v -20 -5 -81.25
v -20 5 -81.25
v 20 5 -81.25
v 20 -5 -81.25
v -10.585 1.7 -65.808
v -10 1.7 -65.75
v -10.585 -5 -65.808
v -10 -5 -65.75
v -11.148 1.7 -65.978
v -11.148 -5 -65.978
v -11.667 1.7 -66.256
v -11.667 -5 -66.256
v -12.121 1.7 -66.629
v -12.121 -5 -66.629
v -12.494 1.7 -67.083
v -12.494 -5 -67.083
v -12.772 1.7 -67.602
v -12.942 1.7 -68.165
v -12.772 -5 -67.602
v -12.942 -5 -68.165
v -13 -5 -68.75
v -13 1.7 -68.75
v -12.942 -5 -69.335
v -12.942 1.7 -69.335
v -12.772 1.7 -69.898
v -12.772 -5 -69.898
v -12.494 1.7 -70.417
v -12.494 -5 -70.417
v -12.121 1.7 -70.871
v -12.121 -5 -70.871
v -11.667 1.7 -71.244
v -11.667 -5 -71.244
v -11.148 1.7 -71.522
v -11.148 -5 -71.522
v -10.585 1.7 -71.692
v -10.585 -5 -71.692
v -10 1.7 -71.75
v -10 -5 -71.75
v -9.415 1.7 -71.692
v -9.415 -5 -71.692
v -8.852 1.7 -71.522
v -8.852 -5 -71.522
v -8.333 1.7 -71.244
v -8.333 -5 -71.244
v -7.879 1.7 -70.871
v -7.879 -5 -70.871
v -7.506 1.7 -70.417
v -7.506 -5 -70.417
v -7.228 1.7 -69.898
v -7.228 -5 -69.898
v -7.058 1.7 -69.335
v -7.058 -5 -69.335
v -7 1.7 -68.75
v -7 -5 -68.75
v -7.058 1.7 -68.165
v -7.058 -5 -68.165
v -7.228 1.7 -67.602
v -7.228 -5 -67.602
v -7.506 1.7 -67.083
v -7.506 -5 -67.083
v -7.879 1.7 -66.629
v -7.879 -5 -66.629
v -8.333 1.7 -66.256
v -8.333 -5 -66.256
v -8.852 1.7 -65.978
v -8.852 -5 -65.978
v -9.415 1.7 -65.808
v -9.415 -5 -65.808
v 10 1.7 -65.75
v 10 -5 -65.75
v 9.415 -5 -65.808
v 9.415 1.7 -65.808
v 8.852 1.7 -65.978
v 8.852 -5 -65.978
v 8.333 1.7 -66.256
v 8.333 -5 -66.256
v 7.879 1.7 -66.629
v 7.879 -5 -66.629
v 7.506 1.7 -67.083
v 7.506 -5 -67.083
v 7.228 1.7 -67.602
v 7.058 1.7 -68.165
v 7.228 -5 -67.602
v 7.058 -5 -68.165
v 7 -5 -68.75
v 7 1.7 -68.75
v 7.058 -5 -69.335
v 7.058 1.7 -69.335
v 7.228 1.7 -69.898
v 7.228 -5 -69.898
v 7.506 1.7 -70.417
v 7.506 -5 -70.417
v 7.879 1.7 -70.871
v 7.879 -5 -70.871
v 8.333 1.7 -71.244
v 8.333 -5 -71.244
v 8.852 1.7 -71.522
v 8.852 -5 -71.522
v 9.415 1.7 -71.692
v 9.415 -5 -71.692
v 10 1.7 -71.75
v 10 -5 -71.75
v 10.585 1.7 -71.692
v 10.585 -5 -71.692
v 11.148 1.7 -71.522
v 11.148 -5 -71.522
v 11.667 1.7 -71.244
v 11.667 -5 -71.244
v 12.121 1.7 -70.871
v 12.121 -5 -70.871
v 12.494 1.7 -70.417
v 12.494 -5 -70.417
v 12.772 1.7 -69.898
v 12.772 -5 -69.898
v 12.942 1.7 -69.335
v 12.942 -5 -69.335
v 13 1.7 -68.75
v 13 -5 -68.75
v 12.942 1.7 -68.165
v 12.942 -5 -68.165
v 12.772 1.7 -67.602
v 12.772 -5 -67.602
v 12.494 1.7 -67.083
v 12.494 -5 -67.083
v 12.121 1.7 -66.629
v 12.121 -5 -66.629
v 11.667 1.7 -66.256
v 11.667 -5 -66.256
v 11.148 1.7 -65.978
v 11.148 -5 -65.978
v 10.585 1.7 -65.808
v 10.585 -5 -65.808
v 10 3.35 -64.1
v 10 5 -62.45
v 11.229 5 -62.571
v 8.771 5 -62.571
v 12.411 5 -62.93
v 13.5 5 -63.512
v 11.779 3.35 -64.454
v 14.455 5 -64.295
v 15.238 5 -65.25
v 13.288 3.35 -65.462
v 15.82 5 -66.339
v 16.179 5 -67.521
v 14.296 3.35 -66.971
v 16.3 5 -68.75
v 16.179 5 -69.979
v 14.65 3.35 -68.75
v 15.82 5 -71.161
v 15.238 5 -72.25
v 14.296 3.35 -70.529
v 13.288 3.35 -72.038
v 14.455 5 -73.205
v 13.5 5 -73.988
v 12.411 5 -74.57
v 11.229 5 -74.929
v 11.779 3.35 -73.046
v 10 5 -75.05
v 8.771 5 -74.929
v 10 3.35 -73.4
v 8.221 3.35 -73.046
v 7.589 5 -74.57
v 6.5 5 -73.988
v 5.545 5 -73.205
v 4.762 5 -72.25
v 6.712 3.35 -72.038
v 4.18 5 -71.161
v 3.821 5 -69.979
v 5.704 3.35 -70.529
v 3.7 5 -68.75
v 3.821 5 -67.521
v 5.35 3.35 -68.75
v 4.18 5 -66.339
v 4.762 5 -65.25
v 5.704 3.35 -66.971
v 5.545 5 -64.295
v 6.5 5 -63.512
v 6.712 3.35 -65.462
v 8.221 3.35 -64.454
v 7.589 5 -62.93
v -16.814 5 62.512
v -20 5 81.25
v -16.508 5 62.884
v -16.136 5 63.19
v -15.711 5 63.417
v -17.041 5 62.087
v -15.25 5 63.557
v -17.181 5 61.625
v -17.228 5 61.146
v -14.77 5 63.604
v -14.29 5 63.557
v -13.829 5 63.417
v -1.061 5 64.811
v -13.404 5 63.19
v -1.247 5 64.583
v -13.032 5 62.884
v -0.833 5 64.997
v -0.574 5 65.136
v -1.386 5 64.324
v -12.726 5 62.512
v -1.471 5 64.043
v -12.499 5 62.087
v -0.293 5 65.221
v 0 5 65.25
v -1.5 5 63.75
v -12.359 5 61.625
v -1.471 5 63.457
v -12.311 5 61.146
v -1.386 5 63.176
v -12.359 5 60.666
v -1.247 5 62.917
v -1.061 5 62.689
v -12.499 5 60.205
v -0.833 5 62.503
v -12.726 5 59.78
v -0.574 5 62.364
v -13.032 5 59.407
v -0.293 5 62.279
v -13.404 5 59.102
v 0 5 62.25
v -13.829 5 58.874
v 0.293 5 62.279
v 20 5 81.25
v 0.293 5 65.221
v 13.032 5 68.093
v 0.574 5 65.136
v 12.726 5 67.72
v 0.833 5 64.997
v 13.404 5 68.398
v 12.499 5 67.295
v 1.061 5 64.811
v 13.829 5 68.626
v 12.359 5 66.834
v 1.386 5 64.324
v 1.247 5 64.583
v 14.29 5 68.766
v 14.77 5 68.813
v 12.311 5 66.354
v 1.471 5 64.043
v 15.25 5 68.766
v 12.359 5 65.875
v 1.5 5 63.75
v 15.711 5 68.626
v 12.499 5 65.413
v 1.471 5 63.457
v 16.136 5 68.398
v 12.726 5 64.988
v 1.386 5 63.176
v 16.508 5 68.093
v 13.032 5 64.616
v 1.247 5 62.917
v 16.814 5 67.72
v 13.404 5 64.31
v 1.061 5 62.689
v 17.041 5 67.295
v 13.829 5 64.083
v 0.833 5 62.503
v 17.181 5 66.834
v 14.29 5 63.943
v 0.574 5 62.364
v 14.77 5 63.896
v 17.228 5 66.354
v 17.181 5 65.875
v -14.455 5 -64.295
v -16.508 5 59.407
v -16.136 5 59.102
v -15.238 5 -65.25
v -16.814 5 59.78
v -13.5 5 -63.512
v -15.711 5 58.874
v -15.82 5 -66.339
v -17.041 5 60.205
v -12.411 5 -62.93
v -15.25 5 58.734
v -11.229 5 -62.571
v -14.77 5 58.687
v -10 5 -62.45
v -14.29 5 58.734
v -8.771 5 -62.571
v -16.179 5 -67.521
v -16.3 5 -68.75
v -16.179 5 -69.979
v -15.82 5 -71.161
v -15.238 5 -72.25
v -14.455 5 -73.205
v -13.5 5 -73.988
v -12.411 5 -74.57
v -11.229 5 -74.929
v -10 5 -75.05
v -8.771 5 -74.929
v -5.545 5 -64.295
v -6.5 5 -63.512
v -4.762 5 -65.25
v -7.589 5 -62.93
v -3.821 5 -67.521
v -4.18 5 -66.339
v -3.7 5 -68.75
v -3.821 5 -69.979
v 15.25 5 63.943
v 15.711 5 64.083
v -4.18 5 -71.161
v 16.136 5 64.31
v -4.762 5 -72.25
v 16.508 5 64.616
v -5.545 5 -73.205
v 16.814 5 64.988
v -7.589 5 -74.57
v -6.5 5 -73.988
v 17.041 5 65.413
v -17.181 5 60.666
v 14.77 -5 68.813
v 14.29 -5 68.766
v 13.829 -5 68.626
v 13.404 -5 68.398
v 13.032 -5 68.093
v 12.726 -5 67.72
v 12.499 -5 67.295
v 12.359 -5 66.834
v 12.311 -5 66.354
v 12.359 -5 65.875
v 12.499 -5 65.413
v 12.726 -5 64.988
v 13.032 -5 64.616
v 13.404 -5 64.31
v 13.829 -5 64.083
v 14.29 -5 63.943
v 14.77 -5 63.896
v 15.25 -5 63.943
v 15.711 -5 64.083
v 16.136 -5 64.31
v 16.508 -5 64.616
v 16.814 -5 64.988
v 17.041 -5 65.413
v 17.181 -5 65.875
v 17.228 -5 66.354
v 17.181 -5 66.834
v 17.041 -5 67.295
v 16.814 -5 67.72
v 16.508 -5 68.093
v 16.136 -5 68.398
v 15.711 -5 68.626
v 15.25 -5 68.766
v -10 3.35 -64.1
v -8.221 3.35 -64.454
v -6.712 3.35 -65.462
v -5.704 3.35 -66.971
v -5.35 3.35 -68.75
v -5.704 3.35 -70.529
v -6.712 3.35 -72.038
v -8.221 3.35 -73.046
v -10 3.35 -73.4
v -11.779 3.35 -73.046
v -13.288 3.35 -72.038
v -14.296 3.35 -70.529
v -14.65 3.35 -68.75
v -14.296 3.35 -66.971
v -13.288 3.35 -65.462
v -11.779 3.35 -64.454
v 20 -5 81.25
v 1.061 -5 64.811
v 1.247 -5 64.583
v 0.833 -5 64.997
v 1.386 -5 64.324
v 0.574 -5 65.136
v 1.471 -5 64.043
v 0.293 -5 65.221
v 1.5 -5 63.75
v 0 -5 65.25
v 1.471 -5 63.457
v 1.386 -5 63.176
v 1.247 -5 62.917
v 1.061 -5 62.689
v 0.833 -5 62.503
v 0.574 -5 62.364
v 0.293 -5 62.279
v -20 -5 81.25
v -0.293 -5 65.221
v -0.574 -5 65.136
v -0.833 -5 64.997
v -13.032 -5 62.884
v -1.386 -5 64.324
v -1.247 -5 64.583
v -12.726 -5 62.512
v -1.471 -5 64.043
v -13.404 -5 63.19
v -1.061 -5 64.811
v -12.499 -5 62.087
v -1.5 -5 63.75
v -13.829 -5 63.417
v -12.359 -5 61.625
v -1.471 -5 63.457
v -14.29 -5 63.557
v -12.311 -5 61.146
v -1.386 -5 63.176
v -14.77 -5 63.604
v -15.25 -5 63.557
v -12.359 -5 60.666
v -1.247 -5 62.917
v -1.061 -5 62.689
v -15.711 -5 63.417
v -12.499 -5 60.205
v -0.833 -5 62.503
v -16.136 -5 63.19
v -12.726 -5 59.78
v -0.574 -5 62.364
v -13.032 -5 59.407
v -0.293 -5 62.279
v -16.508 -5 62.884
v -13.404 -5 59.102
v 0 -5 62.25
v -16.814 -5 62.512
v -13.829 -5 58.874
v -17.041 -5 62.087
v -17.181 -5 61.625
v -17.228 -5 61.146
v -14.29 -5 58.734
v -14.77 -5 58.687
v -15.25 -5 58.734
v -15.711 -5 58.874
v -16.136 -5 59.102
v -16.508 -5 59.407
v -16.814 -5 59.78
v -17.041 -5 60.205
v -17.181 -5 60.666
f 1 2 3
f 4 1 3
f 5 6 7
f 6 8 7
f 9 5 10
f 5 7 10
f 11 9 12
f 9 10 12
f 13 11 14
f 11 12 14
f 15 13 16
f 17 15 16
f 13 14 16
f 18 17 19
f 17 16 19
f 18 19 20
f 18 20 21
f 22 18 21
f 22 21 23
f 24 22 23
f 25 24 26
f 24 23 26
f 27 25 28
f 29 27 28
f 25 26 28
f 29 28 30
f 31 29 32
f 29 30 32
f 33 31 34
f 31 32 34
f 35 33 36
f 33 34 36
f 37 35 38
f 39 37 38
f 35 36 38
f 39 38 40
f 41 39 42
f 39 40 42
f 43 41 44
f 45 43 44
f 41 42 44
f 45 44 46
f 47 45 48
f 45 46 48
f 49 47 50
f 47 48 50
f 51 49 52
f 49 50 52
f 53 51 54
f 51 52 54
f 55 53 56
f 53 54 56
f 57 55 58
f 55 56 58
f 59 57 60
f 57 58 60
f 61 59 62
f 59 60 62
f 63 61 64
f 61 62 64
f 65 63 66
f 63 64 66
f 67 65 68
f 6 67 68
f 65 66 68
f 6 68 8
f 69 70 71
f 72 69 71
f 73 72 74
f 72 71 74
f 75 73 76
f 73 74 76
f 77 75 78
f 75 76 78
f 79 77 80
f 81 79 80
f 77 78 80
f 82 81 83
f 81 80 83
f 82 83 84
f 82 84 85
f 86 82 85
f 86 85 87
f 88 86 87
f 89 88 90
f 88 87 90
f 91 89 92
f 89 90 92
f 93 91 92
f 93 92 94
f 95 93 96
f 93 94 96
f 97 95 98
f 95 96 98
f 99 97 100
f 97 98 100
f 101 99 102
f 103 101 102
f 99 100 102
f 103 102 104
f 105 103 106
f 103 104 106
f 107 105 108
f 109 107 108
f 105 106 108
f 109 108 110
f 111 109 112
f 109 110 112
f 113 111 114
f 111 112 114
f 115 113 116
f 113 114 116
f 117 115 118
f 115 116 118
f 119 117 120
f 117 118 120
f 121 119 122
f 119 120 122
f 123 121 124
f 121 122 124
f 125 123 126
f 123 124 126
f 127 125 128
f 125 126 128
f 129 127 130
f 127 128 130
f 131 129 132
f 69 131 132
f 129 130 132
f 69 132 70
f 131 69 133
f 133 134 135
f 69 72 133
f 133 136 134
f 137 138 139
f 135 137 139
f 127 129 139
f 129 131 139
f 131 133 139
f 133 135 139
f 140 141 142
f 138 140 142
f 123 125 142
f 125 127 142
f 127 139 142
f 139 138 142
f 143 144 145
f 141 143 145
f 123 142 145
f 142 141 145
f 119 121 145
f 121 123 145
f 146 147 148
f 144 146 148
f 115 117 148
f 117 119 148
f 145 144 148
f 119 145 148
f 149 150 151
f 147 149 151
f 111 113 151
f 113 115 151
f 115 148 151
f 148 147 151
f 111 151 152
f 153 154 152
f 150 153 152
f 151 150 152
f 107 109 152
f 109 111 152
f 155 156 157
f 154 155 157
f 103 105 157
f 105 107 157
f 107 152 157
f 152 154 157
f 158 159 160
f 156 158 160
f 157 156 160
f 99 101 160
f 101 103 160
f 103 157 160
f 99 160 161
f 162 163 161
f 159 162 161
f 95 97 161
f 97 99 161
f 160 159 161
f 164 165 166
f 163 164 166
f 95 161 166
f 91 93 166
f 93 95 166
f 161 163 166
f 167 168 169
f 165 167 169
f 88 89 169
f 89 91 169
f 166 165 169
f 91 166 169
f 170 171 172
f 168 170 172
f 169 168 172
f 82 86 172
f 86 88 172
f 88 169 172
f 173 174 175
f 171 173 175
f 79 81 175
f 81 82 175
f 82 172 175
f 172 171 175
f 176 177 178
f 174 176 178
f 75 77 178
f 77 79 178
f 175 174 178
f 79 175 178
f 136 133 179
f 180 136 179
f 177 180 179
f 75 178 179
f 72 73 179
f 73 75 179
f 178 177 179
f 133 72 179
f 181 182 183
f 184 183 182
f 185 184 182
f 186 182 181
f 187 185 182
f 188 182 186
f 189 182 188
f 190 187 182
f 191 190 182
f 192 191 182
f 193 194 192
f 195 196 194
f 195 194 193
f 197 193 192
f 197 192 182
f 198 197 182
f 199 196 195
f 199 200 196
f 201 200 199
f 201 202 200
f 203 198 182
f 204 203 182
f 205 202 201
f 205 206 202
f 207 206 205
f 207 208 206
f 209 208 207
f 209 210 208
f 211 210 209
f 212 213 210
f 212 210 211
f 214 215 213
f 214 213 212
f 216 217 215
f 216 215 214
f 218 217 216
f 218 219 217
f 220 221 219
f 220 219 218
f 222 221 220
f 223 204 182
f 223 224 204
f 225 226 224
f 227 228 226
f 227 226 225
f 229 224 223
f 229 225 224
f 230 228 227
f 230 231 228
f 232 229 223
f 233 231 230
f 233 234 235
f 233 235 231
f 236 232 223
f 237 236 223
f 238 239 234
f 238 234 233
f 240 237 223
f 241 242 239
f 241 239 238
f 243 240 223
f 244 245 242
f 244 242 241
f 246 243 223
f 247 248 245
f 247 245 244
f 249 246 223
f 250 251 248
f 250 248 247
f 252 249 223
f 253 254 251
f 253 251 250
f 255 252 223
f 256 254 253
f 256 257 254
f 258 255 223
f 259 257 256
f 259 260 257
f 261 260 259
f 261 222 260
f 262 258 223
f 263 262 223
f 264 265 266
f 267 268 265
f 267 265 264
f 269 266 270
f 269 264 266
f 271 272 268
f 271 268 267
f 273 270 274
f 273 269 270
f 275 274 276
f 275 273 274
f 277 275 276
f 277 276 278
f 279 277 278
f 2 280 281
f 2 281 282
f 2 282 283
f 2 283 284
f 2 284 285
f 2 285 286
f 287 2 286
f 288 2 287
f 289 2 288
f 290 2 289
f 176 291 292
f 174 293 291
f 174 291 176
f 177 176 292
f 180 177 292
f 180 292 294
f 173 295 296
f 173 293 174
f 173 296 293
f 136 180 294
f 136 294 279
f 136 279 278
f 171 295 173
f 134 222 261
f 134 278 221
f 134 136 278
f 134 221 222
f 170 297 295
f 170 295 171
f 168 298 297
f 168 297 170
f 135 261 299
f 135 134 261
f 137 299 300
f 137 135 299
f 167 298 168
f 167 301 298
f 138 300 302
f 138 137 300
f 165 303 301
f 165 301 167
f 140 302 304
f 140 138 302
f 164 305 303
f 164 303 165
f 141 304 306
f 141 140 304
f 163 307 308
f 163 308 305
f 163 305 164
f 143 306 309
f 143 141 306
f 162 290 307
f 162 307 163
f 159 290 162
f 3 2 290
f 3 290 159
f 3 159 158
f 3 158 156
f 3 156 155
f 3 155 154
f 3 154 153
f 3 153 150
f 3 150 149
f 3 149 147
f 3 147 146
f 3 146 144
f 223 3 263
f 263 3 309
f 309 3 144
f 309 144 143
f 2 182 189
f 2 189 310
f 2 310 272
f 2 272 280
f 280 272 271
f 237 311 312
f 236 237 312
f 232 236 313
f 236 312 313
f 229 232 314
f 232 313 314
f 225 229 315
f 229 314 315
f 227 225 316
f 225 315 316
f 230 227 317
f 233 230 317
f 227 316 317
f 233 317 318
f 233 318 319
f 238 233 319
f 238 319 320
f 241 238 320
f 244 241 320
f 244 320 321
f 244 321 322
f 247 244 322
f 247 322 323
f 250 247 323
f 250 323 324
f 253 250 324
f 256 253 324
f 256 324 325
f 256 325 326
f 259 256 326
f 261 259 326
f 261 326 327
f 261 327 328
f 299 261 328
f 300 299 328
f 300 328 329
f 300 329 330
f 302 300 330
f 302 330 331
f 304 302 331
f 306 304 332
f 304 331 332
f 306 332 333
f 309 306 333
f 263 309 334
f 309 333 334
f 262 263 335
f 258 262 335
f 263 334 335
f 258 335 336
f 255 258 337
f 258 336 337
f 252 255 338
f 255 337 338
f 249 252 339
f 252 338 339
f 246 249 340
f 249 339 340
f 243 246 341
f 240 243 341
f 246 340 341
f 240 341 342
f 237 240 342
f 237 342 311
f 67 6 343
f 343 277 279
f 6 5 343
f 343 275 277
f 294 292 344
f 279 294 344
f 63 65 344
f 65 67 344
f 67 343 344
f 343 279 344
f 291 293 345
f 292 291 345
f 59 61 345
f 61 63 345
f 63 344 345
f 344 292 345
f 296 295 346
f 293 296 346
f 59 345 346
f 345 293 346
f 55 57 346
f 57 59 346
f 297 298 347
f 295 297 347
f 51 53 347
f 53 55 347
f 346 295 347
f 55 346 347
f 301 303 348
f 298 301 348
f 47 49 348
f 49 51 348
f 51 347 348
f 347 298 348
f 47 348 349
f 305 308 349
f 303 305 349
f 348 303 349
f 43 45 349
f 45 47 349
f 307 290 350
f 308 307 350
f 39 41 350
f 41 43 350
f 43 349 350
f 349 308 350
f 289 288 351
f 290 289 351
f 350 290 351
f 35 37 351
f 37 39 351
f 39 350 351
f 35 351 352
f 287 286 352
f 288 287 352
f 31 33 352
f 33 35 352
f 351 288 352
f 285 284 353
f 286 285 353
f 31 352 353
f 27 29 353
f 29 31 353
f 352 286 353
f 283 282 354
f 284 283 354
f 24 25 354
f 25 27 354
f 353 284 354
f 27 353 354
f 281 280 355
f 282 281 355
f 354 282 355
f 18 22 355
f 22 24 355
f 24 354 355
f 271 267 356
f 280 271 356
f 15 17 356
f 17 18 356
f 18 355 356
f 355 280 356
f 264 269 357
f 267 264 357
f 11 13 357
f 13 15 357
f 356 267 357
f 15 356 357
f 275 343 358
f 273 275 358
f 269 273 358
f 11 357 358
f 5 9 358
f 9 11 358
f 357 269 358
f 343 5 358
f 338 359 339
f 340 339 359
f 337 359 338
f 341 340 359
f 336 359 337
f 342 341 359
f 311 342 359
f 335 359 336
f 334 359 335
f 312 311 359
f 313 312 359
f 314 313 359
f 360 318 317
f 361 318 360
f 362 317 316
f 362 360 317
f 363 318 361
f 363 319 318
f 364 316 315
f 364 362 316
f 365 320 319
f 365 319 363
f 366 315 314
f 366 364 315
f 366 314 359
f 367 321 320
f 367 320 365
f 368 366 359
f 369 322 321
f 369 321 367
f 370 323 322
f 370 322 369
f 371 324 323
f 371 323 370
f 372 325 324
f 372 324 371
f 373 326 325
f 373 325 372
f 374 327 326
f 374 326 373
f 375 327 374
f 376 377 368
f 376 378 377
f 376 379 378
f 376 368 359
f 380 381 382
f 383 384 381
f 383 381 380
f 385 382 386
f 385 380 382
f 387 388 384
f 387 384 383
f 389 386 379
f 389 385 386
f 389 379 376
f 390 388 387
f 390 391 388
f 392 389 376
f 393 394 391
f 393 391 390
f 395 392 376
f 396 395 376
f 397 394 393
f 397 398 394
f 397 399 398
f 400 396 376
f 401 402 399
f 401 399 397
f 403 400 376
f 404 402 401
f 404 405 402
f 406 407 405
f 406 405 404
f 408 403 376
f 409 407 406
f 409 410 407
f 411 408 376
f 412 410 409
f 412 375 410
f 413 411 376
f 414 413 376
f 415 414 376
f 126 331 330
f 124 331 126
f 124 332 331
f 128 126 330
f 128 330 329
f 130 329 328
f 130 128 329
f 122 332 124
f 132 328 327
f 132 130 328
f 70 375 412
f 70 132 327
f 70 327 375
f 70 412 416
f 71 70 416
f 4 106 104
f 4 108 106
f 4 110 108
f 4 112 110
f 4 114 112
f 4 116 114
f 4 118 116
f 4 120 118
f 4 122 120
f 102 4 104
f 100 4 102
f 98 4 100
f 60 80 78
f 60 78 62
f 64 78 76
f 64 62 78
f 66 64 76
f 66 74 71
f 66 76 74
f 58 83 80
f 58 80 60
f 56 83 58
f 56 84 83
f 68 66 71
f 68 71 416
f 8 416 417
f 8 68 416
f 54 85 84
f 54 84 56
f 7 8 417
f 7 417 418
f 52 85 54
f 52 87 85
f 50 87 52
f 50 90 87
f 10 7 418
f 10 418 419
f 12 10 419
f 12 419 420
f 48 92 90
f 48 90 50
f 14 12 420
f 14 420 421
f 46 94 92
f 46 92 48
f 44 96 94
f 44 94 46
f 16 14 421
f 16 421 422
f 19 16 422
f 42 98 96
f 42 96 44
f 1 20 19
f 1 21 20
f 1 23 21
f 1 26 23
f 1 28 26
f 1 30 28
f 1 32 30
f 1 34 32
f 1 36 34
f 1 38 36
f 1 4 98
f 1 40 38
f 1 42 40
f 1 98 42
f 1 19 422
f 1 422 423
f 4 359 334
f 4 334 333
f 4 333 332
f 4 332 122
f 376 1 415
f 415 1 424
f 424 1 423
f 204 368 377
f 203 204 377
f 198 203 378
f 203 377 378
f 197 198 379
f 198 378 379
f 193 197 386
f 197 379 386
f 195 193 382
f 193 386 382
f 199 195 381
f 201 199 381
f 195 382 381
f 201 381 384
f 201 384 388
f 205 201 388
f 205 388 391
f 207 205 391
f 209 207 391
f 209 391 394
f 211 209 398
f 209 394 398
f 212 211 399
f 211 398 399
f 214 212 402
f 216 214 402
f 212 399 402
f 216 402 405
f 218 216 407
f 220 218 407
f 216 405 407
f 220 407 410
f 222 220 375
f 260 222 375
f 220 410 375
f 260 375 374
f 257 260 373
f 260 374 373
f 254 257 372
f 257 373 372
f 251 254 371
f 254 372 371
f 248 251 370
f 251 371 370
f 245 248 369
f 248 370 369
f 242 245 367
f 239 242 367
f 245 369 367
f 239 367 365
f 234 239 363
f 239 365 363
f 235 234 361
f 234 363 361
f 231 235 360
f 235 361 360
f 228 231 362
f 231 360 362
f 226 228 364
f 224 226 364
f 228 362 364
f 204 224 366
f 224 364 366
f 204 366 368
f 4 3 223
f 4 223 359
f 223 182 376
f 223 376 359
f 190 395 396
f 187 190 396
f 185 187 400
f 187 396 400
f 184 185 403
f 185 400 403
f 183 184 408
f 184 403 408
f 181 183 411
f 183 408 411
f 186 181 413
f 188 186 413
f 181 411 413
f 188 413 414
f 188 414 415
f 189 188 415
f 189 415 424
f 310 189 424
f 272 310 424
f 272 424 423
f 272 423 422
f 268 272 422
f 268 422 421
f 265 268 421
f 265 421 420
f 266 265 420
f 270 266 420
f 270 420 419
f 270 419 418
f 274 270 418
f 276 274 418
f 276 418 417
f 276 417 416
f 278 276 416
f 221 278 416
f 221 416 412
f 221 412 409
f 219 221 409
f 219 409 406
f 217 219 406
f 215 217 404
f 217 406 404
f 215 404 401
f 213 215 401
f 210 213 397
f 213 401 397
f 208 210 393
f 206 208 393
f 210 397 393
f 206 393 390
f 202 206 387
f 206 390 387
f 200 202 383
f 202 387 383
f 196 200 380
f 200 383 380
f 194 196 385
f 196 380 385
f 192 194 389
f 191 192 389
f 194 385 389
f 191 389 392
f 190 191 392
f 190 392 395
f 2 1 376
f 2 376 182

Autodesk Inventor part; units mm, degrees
ref_plane "YZ Plane" through (0, 0, 0) normal (1, 0, 0) x (0, 1, 0)
ref_plane "XZ Plane" through (0, 0, 0) normal (0, 1, 0) x (-1, 0, 0)
ref_plane "XY Plane" through (0, 0, 0) normal (0, 0, 1) x (1, 0, 0)
sketch "Sketch1" plane through (0, 0, 0) normal (0, 0, 1) x (1, 0, 0)
  line L0 (-20, 5) -> (20, 5)
  line L1 (20, 5) -> (20, -5)
  line L2 (20, -5) -> (-20, -5)
  line L3 (-20, -5) -> (-20, 5)
  line L4 (-20, 5) -> (20, -5) construction
  line L5 (20, 5) -> (-20, -5) construction
  point P0 (0, 0)
extrude "Extrusion1" add sketch "Sketch1" along normal mid plane 162.5
sketch "Sketch4" plane through (-20, 5, 81.25) normal (0, 1, 0) x (1, 0, 0)
  line L0 (0, 162.5) -> (40, 162.5) projected
  point P0 (20, 81.25)
  point P1 (10, 150)
  point P2 (30, 150)
  dimension "d28" = 10
  dimension "d29" = 20
  dimension "d30" = 12.5
hole "Hole3" at (-10, 5, -68.75) at (10, 5, -68.75) direction (0, -1, 0) diameter 6 depth 10.4 countersink diameter 12.6 countersink angle 90
sketch "Sketch5" plane through (-20, 5, 81.25) normal (0, 1, 0) x (1, 0, 0)
  circle A0 centre (30, 150) radius 6.3 projected
  point P0 (20, 81.25)
  point P1 (20, 17.5)
  dimension "d38" = 132.5
hole "Hole4" at (0, 5, 63.75) direction (0, -1, 0) diameter 3 depth 10.4
sketch "Sketch6" plane through (-20, 5, 81.25) normal (0, 1, 0) x (1, 0, 0)
  circle A0 centre (20, 17.5) radius 1.5 projected
  line L0 (20, 17.5) -> (3, 17.5) construction
  line L1 (5.23, 20.1043) -> (20, 17.5) construction
  line L2 (20, 17.5) -> (34.77, 14.8957) construction
  point P0 (20, 81.25)
  dimension "d46" = 10
  dimension "d47" = 10
  dimension "d48" = 14.77
  dimension "d49" = 14.77
hole "Hole5" at (-14.77, 5, 61.1457) at (14.77, 5, 66.3543) direction (0, -1, 0) diameter 4.917 depth 17.1 thread size "M6x1" class "6H" standard "ISO Metric profile"
equation "\"d49\" = d48"
properties part number "Support Beam" material "Brass, Soft Yellow"
